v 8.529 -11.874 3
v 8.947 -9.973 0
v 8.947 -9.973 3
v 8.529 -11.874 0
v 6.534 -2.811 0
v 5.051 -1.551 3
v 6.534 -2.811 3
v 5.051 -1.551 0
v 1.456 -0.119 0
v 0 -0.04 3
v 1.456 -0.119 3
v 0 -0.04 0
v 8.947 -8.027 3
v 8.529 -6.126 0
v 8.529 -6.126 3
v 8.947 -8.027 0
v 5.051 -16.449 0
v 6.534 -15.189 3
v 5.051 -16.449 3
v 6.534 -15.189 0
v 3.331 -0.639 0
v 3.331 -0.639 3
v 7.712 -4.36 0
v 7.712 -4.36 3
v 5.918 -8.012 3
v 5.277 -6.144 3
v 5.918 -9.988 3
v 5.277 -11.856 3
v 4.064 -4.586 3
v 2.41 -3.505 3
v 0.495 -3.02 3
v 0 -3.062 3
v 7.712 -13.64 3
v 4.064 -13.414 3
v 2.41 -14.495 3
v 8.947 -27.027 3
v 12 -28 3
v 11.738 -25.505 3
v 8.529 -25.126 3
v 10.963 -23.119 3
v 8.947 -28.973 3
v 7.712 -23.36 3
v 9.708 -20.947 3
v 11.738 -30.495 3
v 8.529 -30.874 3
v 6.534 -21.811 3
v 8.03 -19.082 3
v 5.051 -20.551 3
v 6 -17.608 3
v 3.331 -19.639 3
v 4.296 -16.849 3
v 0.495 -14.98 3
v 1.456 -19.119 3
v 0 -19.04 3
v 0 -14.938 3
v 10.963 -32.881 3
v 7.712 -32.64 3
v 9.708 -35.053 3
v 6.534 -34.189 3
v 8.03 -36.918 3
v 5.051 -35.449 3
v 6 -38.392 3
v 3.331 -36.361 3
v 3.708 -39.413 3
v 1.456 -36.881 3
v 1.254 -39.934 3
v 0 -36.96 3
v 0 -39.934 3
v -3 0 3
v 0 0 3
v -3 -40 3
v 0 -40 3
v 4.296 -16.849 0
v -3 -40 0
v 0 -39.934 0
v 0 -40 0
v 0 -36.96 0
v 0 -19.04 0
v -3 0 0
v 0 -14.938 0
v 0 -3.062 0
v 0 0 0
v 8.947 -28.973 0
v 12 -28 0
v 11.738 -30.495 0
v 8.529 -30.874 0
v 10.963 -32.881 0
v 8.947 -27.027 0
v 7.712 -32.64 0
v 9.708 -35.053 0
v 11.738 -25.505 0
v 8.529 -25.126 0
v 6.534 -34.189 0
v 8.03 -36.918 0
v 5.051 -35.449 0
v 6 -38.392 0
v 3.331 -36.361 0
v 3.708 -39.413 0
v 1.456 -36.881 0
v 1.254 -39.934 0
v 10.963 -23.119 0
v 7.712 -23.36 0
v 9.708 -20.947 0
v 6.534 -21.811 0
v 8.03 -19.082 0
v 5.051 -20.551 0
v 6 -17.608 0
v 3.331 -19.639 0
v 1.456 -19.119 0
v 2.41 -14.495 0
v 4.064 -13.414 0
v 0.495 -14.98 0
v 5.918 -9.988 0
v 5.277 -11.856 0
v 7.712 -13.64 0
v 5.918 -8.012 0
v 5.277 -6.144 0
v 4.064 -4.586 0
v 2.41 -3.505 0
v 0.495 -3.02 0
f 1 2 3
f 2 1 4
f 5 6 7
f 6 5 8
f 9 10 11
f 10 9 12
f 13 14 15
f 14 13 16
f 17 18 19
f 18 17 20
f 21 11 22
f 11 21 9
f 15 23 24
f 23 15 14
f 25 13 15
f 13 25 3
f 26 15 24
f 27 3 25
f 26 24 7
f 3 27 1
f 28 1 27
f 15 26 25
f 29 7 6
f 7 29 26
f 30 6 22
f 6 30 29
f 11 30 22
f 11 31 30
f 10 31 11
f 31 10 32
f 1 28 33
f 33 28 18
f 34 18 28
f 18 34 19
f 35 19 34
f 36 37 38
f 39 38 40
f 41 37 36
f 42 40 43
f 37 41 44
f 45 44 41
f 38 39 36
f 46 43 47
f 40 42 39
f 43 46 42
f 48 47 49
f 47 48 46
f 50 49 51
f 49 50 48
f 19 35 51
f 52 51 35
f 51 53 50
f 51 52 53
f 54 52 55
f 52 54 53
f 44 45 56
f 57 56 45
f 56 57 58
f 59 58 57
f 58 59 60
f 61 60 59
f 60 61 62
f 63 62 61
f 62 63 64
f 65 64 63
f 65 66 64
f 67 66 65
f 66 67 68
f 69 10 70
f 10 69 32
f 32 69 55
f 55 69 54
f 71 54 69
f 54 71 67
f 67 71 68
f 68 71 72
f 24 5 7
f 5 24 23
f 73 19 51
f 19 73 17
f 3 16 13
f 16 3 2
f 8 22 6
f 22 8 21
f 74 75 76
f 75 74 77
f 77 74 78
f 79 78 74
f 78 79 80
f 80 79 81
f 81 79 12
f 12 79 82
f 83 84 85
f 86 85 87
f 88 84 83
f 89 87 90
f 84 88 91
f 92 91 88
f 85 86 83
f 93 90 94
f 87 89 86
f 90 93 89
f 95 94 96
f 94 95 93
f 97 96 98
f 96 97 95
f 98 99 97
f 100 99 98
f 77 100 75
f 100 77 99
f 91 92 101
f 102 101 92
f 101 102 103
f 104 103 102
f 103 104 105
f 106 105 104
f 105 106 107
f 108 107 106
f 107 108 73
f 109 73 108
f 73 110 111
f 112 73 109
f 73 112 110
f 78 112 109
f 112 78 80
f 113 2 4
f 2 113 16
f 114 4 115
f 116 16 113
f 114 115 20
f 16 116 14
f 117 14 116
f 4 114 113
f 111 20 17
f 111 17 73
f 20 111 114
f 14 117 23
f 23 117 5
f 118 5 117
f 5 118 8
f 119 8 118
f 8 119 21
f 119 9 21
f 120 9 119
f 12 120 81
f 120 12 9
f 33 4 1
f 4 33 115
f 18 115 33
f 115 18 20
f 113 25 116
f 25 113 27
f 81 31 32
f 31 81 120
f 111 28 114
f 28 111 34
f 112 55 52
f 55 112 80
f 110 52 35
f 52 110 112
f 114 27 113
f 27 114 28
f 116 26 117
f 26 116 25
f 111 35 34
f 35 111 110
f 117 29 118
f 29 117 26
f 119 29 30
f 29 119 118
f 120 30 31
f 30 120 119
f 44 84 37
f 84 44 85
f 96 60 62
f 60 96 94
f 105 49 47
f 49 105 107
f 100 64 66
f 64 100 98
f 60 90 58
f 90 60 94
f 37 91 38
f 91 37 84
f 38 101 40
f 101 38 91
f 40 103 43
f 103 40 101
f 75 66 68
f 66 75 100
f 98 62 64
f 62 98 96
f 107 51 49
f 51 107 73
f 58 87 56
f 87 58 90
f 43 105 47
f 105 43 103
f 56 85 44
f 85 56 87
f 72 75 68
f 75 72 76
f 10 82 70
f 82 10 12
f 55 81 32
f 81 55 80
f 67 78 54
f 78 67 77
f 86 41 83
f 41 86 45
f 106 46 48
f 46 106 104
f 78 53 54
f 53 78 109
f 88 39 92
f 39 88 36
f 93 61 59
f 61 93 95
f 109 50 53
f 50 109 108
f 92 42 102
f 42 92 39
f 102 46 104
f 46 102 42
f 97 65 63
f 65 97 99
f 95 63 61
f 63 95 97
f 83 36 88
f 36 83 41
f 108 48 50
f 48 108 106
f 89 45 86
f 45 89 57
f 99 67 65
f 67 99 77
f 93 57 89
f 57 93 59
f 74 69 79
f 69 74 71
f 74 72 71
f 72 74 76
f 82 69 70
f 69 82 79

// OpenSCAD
x=6;

rotate([0,0,180])
  union(){ 
 
  union(){
    cube([3,40,3]);

  difference(){
   translate([0,9,0]) cylinder(x/2,1.5*x,1.5*x);

   translate([1,-1,-1]) cube(30);
  
    translate([0,9,-1]) cylinder(x-1,x,x);
}
  difference(){
   translate([0,28,0]) cylinder(3,2*x,2*x);
    translate([0,15,-1]) cube(40);
     translate([0,28,-1]) cylinder(x*5/6,1.5*x,1.5*x);
}
}
}
